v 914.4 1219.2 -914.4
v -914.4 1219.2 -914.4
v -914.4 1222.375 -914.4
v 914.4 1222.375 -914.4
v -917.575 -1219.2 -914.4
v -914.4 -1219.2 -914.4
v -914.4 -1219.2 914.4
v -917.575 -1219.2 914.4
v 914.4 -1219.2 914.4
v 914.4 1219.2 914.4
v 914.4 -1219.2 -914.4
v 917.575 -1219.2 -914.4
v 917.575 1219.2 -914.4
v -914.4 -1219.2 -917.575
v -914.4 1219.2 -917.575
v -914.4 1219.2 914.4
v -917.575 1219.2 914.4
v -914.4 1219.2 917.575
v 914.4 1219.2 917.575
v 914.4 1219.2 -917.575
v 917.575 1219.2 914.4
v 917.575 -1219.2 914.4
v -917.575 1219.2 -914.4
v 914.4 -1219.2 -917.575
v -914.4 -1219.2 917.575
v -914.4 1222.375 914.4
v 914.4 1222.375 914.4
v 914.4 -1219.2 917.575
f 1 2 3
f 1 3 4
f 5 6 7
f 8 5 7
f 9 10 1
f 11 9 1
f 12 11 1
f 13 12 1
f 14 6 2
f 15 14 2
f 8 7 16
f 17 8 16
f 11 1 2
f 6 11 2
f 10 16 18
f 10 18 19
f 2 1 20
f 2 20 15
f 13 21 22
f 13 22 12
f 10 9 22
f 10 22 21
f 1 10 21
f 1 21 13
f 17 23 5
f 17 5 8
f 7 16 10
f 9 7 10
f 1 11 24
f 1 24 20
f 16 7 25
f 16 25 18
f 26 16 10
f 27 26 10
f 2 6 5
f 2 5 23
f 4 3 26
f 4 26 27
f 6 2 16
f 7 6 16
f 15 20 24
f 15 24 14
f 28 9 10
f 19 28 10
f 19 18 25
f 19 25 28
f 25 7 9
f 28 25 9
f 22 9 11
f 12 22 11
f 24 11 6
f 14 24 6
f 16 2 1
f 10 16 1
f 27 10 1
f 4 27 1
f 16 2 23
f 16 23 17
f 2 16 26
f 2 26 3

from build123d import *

# Parameters (mm, degrees)
SKETCH14_W                                   = 1828.8
SKETCH14_H                                   = 1828.8
BOSS_EXTRUDE20_DEPTH                         = 3.175
SKETCH13_W                                   = 1828.8
SKETCH13_H                                   = 2438.4
ILLUMINANCE_PLANE_1_15_2019_3_02_36_PM_DEPTH = 3.175
SKETCH12_W                                   = 1828.8
SKETCH12_H                                   = 2438.4
BOSS_EXTRUDE18_DEPTH                         = 3.175
SKETCH11_W                                   = 1828.8
SKETCH11_H                                   = 2438.4
BOSS_EXTRUDE16_DEPTH                         = 3.175
SKETCH2_W                                    = 1828.8
SKETCH2_H                                    = 2438.4
BOSS_EXTRUDE5_DEPTH                          = 3.175


with BuildPart() as part:
    # Sketch14 → Boss-Extrude20 (new body)
    with BuildSketch(Plane(origin=(0, 1219.2, 0), x_dir=(1, 0, 0), z_dir=(0, 1, 0))):
        Rectangle(SKETCH14_W, SKETCH14_H)
    extrude(amount=BOSS_EXTRUDE20_DEPTH)


with BuildPart() as body_2:
    # Sketch13 → Illuminance Plane 1-15-2019 3_02_36 PM (new body)
    with BuildSketch(Plane(origin=(0, 0, -914.4), x_dir=(-1, 0, 0), z_dir=(0, 0, -1))):
        Rectangle(SKETCH13_W, SKETCH13_H)
    extrude(amount=ILLUMINANCE_PLANE_1_15_2019_3_02_36_PM_DEPTH)


with BuildPart() as body_3:
    # Sketch12 → Boss-Extrude18 (new body)
    with BuildSketch(Plane.ZY.offset(914.4)):
        Rectangle(SKETCH12_W, SKETCH12_H)
    extrude(amount=BOSS_EXTRUDE18_DEPTH)


with BuildPart() as body_4:
    # Sketch11 → Boss-Extrude16 (new body)
    with BuildSketch(Plane(origin=(914.4, 0, 0), x_dir=(0, 0, -1), z_dir=(1, 0, 0))):
        Rectangle(SKETCH11_W, SKETCH11_H)
    extrude(amount=BOSS_EXTRUDE16_DEPTH)


with BuildPart() as body_5:
    # Sketch2 → Boss-Extrude5 (new body)
    with BuildSketch(Plane.XY.offset(914.4)):
        Rectangle(SKETCH2_W, SKETCH2_H)
    extrude(amount=BOSS_EXTRUDE5_DEPTH)


solid = Compound([part.part, body_2.part, body_3.part, body_4.part, body_5.part])
